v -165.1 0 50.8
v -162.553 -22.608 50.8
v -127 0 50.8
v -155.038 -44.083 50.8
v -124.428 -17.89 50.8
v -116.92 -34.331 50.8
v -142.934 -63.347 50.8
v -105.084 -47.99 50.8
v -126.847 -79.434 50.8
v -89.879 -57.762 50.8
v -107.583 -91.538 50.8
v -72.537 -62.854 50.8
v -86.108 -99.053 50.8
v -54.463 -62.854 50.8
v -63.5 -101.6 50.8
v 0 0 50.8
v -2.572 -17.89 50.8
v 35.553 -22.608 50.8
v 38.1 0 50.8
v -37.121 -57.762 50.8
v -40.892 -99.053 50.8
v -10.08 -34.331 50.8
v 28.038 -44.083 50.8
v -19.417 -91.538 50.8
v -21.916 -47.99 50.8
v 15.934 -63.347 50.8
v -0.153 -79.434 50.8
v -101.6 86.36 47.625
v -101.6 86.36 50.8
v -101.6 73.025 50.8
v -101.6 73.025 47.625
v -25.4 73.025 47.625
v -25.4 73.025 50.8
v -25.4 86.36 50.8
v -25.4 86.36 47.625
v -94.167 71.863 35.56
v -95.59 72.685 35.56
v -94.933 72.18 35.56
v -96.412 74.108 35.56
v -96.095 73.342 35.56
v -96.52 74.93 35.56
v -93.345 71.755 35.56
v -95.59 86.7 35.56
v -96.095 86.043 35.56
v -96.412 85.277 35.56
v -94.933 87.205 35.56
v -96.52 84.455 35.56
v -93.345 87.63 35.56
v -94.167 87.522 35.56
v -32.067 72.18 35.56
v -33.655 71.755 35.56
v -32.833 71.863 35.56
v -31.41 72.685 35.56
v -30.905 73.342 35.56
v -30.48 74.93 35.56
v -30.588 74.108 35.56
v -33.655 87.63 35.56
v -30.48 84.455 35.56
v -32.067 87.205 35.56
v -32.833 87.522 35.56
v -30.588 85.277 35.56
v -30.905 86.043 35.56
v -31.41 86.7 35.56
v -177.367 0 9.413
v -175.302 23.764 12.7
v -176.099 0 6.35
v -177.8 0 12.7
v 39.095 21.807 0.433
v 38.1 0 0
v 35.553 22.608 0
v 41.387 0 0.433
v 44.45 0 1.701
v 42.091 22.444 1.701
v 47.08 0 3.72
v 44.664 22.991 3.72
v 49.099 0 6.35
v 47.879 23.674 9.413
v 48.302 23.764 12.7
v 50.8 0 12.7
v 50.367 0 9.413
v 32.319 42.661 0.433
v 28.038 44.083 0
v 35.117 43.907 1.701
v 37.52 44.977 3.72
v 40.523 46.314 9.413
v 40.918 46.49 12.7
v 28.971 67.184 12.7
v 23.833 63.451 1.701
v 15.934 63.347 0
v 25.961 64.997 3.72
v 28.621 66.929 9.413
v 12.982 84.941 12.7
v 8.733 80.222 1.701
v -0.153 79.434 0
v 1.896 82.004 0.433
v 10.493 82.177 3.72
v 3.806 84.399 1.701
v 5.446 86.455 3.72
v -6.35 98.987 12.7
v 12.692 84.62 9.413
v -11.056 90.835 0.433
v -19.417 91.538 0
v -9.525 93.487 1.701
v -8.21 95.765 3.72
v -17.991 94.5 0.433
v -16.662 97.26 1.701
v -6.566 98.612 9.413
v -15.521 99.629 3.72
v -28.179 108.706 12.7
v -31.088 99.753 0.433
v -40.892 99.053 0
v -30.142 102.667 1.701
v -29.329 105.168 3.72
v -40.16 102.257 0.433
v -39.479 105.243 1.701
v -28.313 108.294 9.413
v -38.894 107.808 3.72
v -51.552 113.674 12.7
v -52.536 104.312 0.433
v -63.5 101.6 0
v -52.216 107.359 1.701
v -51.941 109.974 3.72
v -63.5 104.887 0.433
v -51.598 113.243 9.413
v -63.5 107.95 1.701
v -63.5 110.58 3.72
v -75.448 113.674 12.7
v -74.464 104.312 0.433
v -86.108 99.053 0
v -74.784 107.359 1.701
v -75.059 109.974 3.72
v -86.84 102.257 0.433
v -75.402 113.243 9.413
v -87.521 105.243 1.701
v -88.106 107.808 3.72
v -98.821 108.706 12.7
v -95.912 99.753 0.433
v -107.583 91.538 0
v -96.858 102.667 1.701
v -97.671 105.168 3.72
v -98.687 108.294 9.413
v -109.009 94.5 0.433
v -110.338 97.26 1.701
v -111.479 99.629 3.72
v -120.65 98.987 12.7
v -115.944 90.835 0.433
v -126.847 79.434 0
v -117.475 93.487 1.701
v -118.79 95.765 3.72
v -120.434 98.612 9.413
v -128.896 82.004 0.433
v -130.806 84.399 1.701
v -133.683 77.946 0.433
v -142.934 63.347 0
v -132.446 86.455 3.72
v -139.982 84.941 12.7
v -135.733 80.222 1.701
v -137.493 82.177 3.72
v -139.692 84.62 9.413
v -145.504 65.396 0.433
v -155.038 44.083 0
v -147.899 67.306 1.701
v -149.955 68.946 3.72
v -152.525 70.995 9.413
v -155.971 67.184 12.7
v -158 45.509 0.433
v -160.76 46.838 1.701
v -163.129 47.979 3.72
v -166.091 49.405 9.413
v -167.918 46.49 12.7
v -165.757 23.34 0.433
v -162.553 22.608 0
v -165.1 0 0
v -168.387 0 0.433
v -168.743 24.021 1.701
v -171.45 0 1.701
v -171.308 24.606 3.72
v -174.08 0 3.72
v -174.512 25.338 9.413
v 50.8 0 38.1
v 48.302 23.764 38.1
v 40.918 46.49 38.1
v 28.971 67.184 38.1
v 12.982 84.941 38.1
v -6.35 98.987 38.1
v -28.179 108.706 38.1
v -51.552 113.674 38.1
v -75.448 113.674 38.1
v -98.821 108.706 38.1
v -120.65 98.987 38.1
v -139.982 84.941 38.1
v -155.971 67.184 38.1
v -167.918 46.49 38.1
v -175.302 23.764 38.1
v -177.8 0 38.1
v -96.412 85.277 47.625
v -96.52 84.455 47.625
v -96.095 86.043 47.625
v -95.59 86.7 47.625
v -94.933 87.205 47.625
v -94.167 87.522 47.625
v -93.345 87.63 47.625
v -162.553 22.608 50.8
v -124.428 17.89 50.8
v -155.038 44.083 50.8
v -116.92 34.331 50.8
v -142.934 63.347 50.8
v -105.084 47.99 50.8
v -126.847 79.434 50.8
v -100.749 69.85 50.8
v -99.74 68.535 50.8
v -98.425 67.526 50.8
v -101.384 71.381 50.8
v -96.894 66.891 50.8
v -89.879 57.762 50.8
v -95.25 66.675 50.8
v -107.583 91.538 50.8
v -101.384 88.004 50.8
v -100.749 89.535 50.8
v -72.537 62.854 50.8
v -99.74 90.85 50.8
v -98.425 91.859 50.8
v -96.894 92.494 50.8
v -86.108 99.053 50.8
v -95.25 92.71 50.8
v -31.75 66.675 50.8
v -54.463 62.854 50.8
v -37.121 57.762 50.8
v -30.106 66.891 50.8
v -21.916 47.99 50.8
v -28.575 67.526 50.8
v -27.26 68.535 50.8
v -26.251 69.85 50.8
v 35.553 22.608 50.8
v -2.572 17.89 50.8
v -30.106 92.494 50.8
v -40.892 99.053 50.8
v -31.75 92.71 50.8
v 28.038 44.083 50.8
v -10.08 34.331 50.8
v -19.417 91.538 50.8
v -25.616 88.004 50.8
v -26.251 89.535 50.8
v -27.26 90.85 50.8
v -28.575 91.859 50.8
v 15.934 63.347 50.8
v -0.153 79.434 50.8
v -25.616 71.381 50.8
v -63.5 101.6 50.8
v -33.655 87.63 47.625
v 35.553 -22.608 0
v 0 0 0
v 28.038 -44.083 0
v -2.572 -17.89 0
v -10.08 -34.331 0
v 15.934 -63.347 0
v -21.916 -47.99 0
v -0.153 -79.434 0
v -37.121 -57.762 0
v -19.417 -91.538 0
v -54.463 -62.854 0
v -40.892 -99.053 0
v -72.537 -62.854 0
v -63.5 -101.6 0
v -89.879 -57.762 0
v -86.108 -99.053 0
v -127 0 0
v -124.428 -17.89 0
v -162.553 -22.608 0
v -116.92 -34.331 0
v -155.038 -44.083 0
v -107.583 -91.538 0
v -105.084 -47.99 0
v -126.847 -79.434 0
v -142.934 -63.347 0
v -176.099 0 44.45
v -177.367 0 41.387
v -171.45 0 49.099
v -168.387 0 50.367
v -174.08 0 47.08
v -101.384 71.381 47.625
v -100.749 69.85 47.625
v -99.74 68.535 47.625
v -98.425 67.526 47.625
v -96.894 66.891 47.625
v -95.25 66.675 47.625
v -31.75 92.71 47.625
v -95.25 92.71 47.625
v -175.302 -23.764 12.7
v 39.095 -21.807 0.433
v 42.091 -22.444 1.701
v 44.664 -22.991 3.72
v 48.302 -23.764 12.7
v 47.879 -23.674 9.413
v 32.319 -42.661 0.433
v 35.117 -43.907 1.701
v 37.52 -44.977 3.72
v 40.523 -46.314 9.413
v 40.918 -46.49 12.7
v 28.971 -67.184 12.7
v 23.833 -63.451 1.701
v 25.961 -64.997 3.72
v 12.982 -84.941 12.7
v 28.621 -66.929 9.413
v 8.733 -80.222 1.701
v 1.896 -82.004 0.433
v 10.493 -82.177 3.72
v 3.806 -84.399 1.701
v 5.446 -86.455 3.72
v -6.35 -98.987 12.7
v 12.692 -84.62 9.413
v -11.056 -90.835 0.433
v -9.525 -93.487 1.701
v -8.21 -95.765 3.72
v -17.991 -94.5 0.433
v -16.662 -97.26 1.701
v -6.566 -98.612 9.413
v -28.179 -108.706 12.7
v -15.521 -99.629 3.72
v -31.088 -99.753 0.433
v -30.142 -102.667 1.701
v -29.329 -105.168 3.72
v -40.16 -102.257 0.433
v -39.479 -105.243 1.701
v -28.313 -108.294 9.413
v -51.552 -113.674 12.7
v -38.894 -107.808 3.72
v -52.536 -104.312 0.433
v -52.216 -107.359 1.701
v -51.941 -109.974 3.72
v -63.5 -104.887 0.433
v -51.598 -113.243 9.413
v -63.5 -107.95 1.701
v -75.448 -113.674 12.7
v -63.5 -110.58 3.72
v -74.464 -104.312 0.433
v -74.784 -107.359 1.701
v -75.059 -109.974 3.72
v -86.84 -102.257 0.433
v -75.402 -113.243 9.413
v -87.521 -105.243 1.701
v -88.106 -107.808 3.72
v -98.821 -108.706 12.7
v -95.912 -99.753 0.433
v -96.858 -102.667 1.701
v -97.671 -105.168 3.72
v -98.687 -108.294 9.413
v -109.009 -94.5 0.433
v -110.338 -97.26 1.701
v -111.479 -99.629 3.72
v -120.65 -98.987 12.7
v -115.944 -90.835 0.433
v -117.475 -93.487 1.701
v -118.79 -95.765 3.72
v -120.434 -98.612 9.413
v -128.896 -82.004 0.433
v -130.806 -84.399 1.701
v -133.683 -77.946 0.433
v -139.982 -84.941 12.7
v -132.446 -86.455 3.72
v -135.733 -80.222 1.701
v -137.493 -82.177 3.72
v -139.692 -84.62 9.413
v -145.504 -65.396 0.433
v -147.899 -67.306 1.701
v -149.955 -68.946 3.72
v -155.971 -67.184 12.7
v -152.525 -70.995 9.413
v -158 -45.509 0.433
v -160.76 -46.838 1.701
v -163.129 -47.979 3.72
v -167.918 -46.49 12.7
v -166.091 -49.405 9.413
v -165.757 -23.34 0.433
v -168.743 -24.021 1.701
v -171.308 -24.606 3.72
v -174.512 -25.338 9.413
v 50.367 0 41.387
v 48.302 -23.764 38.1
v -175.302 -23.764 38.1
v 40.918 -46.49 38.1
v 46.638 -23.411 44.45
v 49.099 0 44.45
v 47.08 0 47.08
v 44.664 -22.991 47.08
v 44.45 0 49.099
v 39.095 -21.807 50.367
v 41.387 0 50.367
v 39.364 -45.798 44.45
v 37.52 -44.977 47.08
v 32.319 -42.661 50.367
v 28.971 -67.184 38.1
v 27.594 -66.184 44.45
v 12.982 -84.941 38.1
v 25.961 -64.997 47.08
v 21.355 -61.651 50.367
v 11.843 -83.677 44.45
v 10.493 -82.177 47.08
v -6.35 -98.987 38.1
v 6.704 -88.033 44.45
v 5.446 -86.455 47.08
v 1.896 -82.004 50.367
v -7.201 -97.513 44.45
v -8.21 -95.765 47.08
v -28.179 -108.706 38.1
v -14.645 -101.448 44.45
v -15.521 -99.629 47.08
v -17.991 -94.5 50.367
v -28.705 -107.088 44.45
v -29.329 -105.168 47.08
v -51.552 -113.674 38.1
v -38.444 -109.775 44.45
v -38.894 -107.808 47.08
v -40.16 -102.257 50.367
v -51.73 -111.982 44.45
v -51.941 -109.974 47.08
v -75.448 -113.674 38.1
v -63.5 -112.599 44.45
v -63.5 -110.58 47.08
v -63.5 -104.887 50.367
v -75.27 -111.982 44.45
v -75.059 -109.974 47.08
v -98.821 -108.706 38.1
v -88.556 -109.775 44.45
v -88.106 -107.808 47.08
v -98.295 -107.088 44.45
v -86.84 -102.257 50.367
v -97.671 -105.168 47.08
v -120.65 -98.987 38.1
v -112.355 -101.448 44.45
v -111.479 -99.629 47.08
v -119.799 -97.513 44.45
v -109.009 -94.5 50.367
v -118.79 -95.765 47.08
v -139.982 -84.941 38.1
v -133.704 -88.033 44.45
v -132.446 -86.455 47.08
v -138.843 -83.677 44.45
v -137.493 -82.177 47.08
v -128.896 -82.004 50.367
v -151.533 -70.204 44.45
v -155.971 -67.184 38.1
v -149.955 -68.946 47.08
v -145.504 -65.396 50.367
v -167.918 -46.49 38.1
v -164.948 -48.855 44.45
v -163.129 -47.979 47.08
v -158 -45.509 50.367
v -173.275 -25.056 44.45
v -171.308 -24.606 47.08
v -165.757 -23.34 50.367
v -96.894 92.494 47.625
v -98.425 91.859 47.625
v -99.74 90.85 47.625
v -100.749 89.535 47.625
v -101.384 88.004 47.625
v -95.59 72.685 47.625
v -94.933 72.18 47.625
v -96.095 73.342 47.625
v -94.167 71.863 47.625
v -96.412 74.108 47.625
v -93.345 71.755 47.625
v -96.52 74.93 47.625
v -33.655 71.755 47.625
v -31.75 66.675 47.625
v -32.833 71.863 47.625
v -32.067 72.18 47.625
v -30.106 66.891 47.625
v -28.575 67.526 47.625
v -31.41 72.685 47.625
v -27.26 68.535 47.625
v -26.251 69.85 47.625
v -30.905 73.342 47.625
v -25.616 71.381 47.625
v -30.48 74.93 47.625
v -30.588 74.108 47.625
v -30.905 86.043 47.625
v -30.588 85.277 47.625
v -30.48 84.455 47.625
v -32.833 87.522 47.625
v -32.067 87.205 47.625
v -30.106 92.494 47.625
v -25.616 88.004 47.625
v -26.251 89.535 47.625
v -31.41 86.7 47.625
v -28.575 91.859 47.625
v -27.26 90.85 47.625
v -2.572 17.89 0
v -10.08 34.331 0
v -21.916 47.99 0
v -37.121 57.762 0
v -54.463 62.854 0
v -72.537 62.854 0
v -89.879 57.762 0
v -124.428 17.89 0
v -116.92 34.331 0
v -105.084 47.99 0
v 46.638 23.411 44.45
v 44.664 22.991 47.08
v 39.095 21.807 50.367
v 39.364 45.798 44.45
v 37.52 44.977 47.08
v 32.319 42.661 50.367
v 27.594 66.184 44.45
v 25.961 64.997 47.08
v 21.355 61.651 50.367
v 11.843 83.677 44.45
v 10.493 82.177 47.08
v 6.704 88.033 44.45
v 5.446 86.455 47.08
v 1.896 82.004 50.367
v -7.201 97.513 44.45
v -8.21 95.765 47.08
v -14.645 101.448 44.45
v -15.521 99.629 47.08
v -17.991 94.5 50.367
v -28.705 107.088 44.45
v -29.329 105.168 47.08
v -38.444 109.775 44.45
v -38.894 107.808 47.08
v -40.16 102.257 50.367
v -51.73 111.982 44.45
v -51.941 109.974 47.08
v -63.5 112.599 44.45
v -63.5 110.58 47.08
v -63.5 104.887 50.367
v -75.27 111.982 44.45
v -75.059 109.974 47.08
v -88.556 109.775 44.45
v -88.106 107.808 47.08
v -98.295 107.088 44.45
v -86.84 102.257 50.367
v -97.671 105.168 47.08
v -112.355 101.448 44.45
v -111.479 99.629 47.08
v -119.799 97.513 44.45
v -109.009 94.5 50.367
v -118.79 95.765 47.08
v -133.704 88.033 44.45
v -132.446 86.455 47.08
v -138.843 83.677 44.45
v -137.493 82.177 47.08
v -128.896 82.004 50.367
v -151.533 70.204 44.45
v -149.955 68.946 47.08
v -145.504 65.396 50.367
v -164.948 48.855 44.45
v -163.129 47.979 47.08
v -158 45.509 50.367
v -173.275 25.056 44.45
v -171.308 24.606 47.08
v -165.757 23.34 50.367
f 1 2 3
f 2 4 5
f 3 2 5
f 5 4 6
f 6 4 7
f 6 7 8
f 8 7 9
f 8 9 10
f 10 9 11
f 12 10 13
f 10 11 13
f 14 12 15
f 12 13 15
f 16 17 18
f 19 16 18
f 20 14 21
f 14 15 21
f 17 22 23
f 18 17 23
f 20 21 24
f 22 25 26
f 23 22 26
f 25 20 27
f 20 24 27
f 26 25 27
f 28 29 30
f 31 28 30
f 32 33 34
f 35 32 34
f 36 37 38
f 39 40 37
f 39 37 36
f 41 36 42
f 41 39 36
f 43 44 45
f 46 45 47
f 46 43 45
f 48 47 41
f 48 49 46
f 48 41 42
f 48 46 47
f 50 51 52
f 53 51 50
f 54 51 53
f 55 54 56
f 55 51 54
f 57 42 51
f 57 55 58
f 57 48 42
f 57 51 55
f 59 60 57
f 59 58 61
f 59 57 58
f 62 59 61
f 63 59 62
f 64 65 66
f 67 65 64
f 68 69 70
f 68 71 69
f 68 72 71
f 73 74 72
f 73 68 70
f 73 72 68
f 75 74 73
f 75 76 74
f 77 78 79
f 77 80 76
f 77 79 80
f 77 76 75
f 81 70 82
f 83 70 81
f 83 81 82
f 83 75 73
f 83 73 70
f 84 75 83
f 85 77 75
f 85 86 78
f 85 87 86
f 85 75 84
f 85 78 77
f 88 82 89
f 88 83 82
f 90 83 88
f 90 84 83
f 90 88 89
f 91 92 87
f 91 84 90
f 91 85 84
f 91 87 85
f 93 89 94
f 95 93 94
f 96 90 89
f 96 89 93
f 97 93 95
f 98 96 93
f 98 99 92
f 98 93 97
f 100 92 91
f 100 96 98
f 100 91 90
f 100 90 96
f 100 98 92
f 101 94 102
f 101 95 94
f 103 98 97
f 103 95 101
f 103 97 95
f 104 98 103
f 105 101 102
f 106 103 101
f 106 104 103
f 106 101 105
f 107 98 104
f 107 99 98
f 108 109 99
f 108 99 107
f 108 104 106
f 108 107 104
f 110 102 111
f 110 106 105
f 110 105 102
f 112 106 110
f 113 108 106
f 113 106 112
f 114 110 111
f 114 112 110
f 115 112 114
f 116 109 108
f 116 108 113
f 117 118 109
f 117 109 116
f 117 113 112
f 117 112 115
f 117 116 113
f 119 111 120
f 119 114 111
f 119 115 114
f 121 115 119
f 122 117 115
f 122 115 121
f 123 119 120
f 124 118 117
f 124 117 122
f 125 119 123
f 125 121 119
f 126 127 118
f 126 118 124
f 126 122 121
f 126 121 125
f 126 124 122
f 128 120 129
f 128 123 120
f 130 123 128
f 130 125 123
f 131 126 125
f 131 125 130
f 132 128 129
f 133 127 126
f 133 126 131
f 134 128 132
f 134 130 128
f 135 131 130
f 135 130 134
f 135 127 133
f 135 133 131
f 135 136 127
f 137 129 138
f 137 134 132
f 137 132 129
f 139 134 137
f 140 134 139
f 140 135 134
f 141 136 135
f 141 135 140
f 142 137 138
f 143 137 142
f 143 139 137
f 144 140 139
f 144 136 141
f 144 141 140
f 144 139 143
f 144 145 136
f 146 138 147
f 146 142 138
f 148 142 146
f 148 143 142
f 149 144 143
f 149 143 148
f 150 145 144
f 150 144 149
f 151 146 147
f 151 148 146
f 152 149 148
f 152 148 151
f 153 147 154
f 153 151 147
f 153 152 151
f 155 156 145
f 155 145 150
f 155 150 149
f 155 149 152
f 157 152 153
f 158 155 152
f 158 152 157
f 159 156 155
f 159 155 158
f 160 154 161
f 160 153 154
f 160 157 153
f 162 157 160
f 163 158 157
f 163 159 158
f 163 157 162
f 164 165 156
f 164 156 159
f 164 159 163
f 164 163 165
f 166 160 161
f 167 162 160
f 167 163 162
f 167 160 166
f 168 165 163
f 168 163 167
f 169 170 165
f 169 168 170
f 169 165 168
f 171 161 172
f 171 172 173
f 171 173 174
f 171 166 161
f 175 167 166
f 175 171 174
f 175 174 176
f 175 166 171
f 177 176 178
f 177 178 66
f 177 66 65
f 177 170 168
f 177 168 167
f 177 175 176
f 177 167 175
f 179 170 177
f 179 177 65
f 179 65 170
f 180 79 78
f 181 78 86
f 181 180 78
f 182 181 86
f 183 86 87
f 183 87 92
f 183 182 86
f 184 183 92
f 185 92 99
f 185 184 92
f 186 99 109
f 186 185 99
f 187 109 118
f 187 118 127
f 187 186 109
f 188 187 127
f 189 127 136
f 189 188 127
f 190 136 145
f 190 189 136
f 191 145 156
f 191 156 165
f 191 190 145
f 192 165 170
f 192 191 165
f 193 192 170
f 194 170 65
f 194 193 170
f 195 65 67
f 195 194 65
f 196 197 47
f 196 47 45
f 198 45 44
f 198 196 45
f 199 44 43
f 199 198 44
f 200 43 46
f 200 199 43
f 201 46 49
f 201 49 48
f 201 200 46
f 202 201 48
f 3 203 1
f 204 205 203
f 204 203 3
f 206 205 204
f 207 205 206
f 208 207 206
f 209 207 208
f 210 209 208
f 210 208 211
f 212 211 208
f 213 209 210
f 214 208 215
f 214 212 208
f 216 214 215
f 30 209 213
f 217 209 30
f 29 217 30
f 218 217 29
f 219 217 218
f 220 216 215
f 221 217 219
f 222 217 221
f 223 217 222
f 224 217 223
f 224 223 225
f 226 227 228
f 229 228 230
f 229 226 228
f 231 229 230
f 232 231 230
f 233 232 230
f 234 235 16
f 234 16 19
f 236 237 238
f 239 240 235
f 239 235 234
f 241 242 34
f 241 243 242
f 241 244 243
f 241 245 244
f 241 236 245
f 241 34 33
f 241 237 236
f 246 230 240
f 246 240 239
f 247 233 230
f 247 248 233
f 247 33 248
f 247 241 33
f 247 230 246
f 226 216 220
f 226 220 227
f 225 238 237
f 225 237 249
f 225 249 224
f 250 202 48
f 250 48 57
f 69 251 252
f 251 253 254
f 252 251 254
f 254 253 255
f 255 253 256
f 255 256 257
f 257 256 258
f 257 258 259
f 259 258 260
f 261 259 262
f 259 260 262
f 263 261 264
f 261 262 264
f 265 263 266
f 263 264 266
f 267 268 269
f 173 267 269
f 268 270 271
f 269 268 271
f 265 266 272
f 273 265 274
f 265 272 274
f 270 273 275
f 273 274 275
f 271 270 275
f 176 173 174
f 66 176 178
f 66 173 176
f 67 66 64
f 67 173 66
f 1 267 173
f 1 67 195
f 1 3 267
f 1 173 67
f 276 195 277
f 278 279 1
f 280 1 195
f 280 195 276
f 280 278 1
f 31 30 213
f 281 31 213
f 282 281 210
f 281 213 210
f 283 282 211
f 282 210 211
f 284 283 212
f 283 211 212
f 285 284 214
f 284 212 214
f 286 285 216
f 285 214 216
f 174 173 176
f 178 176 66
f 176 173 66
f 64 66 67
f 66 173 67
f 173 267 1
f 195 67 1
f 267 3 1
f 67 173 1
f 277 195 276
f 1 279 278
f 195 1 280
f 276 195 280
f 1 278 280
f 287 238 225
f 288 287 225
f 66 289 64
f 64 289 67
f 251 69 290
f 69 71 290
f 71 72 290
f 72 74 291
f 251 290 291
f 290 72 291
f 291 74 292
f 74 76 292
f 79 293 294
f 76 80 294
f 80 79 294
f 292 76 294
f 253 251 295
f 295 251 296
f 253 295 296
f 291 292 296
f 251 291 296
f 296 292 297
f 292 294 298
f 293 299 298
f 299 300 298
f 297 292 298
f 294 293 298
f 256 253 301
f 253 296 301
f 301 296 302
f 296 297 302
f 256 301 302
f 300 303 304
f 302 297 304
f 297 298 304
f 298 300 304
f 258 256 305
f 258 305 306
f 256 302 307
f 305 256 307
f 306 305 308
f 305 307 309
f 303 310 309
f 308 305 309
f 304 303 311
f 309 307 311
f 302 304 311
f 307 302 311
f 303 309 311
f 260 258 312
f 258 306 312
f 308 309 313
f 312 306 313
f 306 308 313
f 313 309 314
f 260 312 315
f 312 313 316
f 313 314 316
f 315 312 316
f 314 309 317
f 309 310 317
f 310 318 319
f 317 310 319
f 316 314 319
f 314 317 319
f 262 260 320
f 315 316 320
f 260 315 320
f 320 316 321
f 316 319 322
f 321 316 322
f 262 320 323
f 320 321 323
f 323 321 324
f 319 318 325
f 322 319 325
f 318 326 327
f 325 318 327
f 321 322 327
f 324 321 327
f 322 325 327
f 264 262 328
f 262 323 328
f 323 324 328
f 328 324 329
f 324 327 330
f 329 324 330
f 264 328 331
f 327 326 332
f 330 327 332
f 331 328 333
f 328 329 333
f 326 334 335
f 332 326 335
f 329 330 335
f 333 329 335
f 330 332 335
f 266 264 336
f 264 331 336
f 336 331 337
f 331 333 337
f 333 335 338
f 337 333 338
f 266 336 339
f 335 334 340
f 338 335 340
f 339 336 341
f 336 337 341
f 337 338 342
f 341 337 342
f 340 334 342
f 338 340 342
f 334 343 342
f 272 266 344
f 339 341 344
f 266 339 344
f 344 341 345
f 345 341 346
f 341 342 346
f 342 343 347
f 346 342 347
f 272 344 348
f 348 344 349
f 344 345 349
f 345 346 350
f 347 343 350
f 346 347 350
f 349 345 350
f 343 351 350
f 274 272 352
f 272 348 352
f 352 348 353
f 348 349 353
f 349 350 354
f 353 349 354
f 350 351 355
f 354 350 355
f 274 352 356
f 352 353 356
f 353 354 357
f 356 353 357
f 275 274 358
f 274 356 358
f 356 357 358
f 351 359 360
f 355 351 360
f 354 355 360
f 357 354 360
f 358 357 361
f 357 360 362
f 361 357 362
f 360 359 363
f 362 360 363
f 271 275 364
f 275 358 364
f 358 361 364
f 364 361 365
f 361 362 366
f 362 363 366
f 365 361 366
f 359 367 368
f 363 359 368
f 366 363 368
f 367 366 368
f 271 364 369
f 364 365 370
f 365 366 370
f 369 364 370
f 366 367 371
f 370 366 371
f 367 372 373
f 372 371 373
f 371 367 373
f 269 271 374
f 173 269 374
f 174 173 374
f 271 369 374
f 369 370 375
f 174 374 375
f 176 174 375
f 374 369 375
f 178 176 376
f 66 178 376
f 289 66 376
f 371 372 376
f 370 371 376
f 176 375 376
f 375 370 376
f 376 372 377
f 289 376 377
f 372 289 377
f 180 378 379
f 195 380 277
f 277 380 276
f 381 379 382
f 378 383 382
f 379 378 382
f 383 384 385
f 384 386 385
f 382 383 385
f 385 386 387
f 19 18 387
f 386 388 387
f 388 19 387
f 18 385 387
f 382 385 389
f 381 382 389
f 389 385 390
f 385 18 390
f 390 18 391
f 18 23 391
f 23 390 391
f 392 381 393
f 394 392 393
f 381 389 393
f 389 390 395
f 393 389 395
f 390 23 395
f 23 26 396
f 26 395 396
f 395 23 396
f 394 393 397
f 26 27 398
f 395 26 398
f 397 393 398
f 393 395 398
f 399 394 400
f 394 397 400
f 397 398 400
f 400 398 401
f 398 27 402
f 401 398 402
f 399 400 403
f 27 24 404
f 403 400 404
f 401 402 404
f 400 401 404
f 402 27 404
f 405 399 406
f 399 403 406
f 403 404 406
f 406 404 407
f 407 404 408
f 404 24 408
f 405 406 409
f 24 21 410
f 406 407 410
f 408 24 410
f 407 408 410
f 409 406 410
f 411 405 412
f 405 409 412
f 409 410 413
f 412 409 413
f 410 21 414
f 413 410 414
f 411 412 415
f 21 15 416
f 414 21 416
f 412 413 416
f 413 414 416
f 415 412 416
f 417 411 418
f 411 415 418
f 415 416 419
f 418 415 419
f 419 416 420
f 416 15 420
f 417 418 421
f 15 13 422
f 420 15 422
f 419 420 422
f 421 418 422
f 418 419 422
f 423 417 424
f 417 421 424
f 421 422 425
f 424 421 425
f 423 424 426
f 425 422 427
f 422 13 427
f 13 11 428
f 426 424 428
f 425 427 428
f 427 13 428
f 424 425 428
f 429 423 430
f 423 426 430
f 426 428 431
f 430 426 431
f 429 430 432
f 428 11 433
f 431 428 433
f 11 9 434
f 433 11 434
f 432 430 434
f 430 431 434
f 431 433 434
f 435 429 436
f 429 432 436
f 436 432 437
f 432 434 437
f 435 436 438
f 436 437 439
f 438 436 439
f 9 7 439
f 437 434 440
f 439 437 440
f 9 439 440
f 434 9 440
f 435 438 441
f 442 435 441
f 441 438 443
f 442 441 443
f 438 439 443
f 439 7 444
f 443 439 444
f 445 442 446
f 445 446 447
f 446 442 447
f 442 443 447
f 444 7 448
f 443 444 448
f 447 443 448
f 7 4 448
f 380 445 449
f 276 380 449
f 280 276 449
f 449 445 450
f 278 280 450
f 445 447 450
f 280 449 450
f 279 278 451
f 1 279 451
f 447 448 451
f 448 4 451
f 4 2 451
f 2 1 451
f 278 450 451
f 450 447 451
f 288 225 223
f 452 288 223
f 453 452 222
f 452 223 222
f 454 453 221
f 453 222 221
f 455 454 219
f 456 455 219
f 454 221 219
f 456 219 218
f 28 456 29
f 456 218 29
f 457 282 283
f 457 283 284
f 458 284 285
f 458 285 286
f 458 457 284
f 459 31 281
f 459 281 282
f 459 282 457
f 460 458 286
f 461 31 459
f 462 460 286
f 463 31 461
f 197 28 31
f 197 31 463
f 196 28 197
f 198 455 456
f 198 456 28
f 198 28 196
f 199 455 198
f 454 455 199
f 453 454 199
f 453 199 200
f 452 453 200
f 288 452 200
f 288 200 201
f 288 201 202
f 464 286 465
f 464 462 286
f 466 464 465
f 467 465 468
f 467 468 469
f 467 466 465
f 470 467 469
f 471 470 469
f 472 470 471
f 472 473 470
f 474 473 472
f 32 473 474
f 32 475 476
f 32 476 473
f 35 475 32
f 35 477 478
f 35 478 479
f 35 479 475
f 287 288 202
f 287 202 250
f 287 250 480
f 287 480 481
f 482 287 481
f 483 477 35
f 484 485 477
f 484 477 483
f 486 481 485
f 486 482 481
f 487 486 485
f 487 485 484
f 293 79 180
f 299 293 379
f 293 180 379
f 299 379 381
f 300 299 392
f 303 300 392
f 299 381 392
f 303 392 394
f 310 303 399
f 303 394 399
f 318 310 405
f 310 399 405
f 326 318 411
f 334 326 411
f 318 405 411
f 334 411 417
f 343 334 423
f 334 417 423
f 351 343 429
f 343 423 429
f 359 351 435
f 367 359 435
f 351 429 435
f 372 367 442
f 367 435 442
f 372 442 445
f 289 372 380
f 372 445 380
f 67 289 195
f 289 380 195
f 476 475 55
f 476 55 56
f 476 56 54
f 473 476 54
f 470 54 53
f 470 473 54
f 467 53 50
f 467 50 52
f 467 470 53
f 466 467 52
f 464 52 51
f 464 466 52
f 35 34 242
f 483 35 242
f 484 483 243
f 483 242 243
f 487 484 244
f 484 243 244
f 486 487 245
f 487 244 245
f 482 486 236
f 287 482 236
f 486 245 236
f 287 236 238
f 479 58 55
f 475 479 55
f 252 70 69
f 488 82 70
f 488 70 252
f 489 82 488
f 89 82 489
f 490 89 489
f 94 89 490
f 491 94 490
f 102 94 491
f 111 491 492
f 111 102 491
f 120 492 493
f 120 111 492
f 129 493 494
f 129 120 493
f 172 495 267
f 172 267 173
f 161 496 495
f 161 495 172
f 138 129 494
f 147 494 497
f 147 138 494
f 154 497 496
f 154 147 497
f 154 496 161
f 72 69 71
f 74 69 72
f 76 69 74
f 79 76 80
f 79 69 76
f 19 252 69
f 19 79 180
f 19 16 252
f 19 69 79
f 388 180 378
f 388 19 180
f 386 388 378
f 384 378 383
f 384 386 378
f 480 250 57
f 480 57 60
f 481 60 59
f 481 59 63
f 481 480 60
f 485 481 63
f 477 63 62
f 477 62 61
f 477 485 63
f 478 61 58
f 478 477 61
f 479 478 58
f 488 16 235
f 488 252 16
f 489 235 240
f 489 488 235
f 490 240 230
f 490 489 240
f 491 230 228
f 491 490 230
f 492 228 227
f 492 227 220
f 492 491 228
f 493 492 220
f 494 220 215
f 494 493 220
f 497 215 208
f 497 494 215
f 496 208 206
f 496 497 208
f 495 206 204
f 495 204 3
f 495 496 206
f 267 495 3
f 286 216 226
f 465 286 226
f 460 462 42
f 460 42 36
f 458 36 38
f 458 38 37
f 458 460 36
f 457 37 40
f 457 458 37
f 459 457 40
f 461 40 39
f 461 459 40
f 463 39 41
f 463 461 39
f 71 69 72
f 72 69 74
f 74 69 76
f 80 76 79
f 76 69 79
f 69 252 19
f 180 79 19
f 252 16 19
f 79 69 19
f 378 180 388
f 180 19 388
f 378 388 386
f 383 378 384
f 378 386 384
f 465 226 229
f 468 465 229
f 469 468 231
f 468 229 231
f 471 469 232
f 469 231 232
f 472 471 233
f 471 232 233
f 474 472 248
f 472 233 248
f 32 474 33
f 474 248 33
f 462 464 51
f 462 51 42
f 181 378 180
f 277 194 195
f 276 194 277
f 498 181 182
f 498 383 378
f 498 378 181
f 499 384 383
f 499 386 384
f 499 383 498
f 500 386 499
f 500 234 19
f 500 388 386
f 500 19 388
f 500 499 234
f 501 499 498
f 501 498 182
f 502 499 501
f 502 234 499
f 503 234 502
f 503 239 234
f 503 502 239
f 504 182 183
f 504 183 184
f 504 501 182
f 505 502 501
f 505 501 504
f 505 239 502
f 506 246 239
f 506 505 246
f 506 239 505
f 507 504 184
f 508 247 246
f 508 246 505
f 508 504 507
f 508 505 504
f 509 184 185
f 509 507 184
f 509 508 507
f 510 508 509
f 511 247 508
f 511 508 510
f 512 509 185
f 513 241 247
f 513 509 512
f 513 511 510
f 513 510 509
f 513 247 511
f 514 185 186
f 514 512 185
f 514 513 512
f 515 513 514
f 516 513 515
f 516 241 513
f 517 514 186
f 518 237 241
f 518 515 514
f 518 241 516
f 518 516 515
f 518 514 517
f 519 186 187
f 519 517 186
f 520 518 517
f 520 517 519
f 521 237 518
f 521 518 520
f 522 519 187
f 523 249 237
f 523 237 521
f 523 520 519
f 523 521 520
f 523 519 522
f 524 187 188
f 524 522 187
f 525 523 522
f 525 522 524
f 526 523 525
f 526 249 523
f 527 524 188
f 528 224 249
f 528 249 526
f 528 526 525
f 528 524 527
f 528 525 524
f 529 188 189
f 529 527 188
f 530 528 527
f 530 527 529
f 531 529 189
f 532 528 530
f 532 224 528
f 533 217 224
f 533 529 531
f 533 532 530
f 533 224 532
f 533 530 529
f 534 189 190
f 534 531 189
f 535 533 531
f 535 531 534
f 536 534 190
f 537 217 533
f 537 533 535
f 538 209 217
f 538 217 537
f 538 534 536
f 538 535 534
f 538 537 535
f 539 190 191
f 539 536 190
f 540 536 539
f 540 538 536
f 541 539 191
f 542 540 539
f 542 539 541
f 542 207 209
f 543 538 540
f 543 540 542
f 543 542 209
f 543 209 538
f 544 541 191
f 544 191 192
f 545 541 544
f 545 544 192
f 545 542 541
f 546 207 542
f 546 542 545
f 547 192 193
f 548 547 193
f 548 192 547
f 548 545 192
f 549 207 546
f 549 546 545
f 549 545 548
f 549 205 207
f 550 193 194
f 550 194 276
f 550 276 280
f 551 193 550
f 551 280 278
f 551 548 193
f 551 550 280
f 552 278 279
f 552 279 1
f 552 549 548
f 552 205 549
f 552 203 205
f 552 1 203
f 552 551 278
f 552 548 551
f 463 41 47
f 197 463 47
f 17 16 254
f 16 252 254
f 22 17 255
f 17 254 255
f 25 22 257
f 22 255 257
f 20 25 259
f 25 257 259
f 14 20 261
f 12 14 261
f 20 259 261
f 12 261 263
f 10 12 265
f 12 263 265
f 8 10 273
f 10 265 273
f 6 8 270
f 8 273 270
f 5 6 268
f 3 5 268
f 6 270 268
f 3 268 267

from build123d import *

# Parameters (mm, degrees)
F1_ANGLE = 180
F2_ANGLE = 180
F4_DEPTH = 3.175
F5_DEPTH = 15.24


with BuildPart() as f1:
    # F0 (on Front) → F1 (revolve)
    with BuildSketch(Plane.XZ):
        with BuildLine():
            Line((0, 0), (38.1, 0))
            ThreePointArc((38.1, 0), (47.0802561211, 3.7197438789), (50.8, 12.7))
            Line((50.8, 12.7), (50.8, 38.1))
            ThreePointArc((50.8, 38.1), (47.0802561211, 47.0802561211), (38.1, 50.8))
            Line((38.1, 50.8), (0, 50.8))
            Line((0, 50.8), (0, 0))
        make_face()
    revolve(axis=Axis((-63.5, 0, 20.0394056737), (0, 0, -1)), revolution_arc=F1_ANGLE)


with BuildPart() as f2:
    # F0 (on Front) → F2 (revolve)
    with BuildSketch(Plane.XZ):
        with BuildLine():
            Line((0, 0), (38.1, 0))
            ThreePointArc((38.1, 0), (47.0802561211, 3.7197438789), (50.8, 12.7))
            Line((50.8, 12.7), (50.8, 38.1))
            ThreePointArc((50.8, 38.1), (47.0802561211, 47.0802561211), (38.1, 50.8))
            Line((38.1, 50.8), (0, 50.8))
            Line((0, 50.8), (0, 0))
        make_face()
    revolve(axis=Axis((-63.5, 0, 20.0394056737), (0, 0, 1)), revolution_arc=F2_ANGLE)

    # F3 (on face) → F4 (cut)
    with BuildSketch(Plane.XY.offset(50.8)):
        with BuildLine():
            Line((-95.25, 66.675), (-63.5, 66.675))
            Line((-63.5, 66.675), (-31.75, 66.675))
            ThreePointArc((-31.75, 66.675), (-27.2598719395, 68.5348719395), (-25.4, 73.025))
            Line((-25.4, 73.025), (-25.4, 86.36))
            ThreePointArc((-25.4, 86.36), (-27.2598719395, 90.8501280605), (-31.75, 92.71))
            Line((-31.75, 92.71), (-63.5, 92.71))
            Line((-63.5, 92.71), (-95.25, 92.71))
            ThreePointArc((-95.25, 92.71), (-99.7401280605, 90.8501280605), (-101.6, 86.36))
            Line((-101.6, 86.36), (-101.6, 73.025))
            ThreePointArc((-101.6, 73.025), (-99.7401280605, 68.5348719395), (-95.25, 66.675))
        make_face()
        with BuildLine():
            ThreePointArc((-96.52, 84.455), (-95.5900640303, 86.7000640303), (-93.345, 87.63))
            Line((-93.345, 87.63), (-63.5, 87.63))
            Line((-63.5, 87.63), (-33.655, 87.63))
            ThreePointArc((-33.655, 87.63), (-31.4099359697, 86.7000640303), (-30.48, 84.455))
            Line((-30.48, 84.455), (-30.48, 74.93))
            ThreePointArc((-30.48, 74.93), (-31.4099359697, 72.6849359697), (-33.655, 71.755))
            Line((-33.655, 71.755), (-63.5, 71.755))
            Line((-63.5, 71.755), (-93.345, 71.755))
            ThreePointArc((-93.345, 71.755), (-95.5900640303, 72.6849359697), (-96.52, 74.93))
            Line((-96.52, 74.93), (-96.52, 84.455))
        make_face(mode=Mode.SUBTRACT)
    extrude(amount=-F4_DEPTH, mode=Mode.SUBTRACT)

    # F5 (cut): a face of the model
    f5_faces = [f2.faces().sort_by_distance(p)[0] for p in [
        (-63.5, 79.6925, 50.8),
    ]]
    extrude(f5_faces, amount=-F5_DEPTH, mode=Mode.SUBTRACT)


solid = Compound([f1.part, f2.part])
